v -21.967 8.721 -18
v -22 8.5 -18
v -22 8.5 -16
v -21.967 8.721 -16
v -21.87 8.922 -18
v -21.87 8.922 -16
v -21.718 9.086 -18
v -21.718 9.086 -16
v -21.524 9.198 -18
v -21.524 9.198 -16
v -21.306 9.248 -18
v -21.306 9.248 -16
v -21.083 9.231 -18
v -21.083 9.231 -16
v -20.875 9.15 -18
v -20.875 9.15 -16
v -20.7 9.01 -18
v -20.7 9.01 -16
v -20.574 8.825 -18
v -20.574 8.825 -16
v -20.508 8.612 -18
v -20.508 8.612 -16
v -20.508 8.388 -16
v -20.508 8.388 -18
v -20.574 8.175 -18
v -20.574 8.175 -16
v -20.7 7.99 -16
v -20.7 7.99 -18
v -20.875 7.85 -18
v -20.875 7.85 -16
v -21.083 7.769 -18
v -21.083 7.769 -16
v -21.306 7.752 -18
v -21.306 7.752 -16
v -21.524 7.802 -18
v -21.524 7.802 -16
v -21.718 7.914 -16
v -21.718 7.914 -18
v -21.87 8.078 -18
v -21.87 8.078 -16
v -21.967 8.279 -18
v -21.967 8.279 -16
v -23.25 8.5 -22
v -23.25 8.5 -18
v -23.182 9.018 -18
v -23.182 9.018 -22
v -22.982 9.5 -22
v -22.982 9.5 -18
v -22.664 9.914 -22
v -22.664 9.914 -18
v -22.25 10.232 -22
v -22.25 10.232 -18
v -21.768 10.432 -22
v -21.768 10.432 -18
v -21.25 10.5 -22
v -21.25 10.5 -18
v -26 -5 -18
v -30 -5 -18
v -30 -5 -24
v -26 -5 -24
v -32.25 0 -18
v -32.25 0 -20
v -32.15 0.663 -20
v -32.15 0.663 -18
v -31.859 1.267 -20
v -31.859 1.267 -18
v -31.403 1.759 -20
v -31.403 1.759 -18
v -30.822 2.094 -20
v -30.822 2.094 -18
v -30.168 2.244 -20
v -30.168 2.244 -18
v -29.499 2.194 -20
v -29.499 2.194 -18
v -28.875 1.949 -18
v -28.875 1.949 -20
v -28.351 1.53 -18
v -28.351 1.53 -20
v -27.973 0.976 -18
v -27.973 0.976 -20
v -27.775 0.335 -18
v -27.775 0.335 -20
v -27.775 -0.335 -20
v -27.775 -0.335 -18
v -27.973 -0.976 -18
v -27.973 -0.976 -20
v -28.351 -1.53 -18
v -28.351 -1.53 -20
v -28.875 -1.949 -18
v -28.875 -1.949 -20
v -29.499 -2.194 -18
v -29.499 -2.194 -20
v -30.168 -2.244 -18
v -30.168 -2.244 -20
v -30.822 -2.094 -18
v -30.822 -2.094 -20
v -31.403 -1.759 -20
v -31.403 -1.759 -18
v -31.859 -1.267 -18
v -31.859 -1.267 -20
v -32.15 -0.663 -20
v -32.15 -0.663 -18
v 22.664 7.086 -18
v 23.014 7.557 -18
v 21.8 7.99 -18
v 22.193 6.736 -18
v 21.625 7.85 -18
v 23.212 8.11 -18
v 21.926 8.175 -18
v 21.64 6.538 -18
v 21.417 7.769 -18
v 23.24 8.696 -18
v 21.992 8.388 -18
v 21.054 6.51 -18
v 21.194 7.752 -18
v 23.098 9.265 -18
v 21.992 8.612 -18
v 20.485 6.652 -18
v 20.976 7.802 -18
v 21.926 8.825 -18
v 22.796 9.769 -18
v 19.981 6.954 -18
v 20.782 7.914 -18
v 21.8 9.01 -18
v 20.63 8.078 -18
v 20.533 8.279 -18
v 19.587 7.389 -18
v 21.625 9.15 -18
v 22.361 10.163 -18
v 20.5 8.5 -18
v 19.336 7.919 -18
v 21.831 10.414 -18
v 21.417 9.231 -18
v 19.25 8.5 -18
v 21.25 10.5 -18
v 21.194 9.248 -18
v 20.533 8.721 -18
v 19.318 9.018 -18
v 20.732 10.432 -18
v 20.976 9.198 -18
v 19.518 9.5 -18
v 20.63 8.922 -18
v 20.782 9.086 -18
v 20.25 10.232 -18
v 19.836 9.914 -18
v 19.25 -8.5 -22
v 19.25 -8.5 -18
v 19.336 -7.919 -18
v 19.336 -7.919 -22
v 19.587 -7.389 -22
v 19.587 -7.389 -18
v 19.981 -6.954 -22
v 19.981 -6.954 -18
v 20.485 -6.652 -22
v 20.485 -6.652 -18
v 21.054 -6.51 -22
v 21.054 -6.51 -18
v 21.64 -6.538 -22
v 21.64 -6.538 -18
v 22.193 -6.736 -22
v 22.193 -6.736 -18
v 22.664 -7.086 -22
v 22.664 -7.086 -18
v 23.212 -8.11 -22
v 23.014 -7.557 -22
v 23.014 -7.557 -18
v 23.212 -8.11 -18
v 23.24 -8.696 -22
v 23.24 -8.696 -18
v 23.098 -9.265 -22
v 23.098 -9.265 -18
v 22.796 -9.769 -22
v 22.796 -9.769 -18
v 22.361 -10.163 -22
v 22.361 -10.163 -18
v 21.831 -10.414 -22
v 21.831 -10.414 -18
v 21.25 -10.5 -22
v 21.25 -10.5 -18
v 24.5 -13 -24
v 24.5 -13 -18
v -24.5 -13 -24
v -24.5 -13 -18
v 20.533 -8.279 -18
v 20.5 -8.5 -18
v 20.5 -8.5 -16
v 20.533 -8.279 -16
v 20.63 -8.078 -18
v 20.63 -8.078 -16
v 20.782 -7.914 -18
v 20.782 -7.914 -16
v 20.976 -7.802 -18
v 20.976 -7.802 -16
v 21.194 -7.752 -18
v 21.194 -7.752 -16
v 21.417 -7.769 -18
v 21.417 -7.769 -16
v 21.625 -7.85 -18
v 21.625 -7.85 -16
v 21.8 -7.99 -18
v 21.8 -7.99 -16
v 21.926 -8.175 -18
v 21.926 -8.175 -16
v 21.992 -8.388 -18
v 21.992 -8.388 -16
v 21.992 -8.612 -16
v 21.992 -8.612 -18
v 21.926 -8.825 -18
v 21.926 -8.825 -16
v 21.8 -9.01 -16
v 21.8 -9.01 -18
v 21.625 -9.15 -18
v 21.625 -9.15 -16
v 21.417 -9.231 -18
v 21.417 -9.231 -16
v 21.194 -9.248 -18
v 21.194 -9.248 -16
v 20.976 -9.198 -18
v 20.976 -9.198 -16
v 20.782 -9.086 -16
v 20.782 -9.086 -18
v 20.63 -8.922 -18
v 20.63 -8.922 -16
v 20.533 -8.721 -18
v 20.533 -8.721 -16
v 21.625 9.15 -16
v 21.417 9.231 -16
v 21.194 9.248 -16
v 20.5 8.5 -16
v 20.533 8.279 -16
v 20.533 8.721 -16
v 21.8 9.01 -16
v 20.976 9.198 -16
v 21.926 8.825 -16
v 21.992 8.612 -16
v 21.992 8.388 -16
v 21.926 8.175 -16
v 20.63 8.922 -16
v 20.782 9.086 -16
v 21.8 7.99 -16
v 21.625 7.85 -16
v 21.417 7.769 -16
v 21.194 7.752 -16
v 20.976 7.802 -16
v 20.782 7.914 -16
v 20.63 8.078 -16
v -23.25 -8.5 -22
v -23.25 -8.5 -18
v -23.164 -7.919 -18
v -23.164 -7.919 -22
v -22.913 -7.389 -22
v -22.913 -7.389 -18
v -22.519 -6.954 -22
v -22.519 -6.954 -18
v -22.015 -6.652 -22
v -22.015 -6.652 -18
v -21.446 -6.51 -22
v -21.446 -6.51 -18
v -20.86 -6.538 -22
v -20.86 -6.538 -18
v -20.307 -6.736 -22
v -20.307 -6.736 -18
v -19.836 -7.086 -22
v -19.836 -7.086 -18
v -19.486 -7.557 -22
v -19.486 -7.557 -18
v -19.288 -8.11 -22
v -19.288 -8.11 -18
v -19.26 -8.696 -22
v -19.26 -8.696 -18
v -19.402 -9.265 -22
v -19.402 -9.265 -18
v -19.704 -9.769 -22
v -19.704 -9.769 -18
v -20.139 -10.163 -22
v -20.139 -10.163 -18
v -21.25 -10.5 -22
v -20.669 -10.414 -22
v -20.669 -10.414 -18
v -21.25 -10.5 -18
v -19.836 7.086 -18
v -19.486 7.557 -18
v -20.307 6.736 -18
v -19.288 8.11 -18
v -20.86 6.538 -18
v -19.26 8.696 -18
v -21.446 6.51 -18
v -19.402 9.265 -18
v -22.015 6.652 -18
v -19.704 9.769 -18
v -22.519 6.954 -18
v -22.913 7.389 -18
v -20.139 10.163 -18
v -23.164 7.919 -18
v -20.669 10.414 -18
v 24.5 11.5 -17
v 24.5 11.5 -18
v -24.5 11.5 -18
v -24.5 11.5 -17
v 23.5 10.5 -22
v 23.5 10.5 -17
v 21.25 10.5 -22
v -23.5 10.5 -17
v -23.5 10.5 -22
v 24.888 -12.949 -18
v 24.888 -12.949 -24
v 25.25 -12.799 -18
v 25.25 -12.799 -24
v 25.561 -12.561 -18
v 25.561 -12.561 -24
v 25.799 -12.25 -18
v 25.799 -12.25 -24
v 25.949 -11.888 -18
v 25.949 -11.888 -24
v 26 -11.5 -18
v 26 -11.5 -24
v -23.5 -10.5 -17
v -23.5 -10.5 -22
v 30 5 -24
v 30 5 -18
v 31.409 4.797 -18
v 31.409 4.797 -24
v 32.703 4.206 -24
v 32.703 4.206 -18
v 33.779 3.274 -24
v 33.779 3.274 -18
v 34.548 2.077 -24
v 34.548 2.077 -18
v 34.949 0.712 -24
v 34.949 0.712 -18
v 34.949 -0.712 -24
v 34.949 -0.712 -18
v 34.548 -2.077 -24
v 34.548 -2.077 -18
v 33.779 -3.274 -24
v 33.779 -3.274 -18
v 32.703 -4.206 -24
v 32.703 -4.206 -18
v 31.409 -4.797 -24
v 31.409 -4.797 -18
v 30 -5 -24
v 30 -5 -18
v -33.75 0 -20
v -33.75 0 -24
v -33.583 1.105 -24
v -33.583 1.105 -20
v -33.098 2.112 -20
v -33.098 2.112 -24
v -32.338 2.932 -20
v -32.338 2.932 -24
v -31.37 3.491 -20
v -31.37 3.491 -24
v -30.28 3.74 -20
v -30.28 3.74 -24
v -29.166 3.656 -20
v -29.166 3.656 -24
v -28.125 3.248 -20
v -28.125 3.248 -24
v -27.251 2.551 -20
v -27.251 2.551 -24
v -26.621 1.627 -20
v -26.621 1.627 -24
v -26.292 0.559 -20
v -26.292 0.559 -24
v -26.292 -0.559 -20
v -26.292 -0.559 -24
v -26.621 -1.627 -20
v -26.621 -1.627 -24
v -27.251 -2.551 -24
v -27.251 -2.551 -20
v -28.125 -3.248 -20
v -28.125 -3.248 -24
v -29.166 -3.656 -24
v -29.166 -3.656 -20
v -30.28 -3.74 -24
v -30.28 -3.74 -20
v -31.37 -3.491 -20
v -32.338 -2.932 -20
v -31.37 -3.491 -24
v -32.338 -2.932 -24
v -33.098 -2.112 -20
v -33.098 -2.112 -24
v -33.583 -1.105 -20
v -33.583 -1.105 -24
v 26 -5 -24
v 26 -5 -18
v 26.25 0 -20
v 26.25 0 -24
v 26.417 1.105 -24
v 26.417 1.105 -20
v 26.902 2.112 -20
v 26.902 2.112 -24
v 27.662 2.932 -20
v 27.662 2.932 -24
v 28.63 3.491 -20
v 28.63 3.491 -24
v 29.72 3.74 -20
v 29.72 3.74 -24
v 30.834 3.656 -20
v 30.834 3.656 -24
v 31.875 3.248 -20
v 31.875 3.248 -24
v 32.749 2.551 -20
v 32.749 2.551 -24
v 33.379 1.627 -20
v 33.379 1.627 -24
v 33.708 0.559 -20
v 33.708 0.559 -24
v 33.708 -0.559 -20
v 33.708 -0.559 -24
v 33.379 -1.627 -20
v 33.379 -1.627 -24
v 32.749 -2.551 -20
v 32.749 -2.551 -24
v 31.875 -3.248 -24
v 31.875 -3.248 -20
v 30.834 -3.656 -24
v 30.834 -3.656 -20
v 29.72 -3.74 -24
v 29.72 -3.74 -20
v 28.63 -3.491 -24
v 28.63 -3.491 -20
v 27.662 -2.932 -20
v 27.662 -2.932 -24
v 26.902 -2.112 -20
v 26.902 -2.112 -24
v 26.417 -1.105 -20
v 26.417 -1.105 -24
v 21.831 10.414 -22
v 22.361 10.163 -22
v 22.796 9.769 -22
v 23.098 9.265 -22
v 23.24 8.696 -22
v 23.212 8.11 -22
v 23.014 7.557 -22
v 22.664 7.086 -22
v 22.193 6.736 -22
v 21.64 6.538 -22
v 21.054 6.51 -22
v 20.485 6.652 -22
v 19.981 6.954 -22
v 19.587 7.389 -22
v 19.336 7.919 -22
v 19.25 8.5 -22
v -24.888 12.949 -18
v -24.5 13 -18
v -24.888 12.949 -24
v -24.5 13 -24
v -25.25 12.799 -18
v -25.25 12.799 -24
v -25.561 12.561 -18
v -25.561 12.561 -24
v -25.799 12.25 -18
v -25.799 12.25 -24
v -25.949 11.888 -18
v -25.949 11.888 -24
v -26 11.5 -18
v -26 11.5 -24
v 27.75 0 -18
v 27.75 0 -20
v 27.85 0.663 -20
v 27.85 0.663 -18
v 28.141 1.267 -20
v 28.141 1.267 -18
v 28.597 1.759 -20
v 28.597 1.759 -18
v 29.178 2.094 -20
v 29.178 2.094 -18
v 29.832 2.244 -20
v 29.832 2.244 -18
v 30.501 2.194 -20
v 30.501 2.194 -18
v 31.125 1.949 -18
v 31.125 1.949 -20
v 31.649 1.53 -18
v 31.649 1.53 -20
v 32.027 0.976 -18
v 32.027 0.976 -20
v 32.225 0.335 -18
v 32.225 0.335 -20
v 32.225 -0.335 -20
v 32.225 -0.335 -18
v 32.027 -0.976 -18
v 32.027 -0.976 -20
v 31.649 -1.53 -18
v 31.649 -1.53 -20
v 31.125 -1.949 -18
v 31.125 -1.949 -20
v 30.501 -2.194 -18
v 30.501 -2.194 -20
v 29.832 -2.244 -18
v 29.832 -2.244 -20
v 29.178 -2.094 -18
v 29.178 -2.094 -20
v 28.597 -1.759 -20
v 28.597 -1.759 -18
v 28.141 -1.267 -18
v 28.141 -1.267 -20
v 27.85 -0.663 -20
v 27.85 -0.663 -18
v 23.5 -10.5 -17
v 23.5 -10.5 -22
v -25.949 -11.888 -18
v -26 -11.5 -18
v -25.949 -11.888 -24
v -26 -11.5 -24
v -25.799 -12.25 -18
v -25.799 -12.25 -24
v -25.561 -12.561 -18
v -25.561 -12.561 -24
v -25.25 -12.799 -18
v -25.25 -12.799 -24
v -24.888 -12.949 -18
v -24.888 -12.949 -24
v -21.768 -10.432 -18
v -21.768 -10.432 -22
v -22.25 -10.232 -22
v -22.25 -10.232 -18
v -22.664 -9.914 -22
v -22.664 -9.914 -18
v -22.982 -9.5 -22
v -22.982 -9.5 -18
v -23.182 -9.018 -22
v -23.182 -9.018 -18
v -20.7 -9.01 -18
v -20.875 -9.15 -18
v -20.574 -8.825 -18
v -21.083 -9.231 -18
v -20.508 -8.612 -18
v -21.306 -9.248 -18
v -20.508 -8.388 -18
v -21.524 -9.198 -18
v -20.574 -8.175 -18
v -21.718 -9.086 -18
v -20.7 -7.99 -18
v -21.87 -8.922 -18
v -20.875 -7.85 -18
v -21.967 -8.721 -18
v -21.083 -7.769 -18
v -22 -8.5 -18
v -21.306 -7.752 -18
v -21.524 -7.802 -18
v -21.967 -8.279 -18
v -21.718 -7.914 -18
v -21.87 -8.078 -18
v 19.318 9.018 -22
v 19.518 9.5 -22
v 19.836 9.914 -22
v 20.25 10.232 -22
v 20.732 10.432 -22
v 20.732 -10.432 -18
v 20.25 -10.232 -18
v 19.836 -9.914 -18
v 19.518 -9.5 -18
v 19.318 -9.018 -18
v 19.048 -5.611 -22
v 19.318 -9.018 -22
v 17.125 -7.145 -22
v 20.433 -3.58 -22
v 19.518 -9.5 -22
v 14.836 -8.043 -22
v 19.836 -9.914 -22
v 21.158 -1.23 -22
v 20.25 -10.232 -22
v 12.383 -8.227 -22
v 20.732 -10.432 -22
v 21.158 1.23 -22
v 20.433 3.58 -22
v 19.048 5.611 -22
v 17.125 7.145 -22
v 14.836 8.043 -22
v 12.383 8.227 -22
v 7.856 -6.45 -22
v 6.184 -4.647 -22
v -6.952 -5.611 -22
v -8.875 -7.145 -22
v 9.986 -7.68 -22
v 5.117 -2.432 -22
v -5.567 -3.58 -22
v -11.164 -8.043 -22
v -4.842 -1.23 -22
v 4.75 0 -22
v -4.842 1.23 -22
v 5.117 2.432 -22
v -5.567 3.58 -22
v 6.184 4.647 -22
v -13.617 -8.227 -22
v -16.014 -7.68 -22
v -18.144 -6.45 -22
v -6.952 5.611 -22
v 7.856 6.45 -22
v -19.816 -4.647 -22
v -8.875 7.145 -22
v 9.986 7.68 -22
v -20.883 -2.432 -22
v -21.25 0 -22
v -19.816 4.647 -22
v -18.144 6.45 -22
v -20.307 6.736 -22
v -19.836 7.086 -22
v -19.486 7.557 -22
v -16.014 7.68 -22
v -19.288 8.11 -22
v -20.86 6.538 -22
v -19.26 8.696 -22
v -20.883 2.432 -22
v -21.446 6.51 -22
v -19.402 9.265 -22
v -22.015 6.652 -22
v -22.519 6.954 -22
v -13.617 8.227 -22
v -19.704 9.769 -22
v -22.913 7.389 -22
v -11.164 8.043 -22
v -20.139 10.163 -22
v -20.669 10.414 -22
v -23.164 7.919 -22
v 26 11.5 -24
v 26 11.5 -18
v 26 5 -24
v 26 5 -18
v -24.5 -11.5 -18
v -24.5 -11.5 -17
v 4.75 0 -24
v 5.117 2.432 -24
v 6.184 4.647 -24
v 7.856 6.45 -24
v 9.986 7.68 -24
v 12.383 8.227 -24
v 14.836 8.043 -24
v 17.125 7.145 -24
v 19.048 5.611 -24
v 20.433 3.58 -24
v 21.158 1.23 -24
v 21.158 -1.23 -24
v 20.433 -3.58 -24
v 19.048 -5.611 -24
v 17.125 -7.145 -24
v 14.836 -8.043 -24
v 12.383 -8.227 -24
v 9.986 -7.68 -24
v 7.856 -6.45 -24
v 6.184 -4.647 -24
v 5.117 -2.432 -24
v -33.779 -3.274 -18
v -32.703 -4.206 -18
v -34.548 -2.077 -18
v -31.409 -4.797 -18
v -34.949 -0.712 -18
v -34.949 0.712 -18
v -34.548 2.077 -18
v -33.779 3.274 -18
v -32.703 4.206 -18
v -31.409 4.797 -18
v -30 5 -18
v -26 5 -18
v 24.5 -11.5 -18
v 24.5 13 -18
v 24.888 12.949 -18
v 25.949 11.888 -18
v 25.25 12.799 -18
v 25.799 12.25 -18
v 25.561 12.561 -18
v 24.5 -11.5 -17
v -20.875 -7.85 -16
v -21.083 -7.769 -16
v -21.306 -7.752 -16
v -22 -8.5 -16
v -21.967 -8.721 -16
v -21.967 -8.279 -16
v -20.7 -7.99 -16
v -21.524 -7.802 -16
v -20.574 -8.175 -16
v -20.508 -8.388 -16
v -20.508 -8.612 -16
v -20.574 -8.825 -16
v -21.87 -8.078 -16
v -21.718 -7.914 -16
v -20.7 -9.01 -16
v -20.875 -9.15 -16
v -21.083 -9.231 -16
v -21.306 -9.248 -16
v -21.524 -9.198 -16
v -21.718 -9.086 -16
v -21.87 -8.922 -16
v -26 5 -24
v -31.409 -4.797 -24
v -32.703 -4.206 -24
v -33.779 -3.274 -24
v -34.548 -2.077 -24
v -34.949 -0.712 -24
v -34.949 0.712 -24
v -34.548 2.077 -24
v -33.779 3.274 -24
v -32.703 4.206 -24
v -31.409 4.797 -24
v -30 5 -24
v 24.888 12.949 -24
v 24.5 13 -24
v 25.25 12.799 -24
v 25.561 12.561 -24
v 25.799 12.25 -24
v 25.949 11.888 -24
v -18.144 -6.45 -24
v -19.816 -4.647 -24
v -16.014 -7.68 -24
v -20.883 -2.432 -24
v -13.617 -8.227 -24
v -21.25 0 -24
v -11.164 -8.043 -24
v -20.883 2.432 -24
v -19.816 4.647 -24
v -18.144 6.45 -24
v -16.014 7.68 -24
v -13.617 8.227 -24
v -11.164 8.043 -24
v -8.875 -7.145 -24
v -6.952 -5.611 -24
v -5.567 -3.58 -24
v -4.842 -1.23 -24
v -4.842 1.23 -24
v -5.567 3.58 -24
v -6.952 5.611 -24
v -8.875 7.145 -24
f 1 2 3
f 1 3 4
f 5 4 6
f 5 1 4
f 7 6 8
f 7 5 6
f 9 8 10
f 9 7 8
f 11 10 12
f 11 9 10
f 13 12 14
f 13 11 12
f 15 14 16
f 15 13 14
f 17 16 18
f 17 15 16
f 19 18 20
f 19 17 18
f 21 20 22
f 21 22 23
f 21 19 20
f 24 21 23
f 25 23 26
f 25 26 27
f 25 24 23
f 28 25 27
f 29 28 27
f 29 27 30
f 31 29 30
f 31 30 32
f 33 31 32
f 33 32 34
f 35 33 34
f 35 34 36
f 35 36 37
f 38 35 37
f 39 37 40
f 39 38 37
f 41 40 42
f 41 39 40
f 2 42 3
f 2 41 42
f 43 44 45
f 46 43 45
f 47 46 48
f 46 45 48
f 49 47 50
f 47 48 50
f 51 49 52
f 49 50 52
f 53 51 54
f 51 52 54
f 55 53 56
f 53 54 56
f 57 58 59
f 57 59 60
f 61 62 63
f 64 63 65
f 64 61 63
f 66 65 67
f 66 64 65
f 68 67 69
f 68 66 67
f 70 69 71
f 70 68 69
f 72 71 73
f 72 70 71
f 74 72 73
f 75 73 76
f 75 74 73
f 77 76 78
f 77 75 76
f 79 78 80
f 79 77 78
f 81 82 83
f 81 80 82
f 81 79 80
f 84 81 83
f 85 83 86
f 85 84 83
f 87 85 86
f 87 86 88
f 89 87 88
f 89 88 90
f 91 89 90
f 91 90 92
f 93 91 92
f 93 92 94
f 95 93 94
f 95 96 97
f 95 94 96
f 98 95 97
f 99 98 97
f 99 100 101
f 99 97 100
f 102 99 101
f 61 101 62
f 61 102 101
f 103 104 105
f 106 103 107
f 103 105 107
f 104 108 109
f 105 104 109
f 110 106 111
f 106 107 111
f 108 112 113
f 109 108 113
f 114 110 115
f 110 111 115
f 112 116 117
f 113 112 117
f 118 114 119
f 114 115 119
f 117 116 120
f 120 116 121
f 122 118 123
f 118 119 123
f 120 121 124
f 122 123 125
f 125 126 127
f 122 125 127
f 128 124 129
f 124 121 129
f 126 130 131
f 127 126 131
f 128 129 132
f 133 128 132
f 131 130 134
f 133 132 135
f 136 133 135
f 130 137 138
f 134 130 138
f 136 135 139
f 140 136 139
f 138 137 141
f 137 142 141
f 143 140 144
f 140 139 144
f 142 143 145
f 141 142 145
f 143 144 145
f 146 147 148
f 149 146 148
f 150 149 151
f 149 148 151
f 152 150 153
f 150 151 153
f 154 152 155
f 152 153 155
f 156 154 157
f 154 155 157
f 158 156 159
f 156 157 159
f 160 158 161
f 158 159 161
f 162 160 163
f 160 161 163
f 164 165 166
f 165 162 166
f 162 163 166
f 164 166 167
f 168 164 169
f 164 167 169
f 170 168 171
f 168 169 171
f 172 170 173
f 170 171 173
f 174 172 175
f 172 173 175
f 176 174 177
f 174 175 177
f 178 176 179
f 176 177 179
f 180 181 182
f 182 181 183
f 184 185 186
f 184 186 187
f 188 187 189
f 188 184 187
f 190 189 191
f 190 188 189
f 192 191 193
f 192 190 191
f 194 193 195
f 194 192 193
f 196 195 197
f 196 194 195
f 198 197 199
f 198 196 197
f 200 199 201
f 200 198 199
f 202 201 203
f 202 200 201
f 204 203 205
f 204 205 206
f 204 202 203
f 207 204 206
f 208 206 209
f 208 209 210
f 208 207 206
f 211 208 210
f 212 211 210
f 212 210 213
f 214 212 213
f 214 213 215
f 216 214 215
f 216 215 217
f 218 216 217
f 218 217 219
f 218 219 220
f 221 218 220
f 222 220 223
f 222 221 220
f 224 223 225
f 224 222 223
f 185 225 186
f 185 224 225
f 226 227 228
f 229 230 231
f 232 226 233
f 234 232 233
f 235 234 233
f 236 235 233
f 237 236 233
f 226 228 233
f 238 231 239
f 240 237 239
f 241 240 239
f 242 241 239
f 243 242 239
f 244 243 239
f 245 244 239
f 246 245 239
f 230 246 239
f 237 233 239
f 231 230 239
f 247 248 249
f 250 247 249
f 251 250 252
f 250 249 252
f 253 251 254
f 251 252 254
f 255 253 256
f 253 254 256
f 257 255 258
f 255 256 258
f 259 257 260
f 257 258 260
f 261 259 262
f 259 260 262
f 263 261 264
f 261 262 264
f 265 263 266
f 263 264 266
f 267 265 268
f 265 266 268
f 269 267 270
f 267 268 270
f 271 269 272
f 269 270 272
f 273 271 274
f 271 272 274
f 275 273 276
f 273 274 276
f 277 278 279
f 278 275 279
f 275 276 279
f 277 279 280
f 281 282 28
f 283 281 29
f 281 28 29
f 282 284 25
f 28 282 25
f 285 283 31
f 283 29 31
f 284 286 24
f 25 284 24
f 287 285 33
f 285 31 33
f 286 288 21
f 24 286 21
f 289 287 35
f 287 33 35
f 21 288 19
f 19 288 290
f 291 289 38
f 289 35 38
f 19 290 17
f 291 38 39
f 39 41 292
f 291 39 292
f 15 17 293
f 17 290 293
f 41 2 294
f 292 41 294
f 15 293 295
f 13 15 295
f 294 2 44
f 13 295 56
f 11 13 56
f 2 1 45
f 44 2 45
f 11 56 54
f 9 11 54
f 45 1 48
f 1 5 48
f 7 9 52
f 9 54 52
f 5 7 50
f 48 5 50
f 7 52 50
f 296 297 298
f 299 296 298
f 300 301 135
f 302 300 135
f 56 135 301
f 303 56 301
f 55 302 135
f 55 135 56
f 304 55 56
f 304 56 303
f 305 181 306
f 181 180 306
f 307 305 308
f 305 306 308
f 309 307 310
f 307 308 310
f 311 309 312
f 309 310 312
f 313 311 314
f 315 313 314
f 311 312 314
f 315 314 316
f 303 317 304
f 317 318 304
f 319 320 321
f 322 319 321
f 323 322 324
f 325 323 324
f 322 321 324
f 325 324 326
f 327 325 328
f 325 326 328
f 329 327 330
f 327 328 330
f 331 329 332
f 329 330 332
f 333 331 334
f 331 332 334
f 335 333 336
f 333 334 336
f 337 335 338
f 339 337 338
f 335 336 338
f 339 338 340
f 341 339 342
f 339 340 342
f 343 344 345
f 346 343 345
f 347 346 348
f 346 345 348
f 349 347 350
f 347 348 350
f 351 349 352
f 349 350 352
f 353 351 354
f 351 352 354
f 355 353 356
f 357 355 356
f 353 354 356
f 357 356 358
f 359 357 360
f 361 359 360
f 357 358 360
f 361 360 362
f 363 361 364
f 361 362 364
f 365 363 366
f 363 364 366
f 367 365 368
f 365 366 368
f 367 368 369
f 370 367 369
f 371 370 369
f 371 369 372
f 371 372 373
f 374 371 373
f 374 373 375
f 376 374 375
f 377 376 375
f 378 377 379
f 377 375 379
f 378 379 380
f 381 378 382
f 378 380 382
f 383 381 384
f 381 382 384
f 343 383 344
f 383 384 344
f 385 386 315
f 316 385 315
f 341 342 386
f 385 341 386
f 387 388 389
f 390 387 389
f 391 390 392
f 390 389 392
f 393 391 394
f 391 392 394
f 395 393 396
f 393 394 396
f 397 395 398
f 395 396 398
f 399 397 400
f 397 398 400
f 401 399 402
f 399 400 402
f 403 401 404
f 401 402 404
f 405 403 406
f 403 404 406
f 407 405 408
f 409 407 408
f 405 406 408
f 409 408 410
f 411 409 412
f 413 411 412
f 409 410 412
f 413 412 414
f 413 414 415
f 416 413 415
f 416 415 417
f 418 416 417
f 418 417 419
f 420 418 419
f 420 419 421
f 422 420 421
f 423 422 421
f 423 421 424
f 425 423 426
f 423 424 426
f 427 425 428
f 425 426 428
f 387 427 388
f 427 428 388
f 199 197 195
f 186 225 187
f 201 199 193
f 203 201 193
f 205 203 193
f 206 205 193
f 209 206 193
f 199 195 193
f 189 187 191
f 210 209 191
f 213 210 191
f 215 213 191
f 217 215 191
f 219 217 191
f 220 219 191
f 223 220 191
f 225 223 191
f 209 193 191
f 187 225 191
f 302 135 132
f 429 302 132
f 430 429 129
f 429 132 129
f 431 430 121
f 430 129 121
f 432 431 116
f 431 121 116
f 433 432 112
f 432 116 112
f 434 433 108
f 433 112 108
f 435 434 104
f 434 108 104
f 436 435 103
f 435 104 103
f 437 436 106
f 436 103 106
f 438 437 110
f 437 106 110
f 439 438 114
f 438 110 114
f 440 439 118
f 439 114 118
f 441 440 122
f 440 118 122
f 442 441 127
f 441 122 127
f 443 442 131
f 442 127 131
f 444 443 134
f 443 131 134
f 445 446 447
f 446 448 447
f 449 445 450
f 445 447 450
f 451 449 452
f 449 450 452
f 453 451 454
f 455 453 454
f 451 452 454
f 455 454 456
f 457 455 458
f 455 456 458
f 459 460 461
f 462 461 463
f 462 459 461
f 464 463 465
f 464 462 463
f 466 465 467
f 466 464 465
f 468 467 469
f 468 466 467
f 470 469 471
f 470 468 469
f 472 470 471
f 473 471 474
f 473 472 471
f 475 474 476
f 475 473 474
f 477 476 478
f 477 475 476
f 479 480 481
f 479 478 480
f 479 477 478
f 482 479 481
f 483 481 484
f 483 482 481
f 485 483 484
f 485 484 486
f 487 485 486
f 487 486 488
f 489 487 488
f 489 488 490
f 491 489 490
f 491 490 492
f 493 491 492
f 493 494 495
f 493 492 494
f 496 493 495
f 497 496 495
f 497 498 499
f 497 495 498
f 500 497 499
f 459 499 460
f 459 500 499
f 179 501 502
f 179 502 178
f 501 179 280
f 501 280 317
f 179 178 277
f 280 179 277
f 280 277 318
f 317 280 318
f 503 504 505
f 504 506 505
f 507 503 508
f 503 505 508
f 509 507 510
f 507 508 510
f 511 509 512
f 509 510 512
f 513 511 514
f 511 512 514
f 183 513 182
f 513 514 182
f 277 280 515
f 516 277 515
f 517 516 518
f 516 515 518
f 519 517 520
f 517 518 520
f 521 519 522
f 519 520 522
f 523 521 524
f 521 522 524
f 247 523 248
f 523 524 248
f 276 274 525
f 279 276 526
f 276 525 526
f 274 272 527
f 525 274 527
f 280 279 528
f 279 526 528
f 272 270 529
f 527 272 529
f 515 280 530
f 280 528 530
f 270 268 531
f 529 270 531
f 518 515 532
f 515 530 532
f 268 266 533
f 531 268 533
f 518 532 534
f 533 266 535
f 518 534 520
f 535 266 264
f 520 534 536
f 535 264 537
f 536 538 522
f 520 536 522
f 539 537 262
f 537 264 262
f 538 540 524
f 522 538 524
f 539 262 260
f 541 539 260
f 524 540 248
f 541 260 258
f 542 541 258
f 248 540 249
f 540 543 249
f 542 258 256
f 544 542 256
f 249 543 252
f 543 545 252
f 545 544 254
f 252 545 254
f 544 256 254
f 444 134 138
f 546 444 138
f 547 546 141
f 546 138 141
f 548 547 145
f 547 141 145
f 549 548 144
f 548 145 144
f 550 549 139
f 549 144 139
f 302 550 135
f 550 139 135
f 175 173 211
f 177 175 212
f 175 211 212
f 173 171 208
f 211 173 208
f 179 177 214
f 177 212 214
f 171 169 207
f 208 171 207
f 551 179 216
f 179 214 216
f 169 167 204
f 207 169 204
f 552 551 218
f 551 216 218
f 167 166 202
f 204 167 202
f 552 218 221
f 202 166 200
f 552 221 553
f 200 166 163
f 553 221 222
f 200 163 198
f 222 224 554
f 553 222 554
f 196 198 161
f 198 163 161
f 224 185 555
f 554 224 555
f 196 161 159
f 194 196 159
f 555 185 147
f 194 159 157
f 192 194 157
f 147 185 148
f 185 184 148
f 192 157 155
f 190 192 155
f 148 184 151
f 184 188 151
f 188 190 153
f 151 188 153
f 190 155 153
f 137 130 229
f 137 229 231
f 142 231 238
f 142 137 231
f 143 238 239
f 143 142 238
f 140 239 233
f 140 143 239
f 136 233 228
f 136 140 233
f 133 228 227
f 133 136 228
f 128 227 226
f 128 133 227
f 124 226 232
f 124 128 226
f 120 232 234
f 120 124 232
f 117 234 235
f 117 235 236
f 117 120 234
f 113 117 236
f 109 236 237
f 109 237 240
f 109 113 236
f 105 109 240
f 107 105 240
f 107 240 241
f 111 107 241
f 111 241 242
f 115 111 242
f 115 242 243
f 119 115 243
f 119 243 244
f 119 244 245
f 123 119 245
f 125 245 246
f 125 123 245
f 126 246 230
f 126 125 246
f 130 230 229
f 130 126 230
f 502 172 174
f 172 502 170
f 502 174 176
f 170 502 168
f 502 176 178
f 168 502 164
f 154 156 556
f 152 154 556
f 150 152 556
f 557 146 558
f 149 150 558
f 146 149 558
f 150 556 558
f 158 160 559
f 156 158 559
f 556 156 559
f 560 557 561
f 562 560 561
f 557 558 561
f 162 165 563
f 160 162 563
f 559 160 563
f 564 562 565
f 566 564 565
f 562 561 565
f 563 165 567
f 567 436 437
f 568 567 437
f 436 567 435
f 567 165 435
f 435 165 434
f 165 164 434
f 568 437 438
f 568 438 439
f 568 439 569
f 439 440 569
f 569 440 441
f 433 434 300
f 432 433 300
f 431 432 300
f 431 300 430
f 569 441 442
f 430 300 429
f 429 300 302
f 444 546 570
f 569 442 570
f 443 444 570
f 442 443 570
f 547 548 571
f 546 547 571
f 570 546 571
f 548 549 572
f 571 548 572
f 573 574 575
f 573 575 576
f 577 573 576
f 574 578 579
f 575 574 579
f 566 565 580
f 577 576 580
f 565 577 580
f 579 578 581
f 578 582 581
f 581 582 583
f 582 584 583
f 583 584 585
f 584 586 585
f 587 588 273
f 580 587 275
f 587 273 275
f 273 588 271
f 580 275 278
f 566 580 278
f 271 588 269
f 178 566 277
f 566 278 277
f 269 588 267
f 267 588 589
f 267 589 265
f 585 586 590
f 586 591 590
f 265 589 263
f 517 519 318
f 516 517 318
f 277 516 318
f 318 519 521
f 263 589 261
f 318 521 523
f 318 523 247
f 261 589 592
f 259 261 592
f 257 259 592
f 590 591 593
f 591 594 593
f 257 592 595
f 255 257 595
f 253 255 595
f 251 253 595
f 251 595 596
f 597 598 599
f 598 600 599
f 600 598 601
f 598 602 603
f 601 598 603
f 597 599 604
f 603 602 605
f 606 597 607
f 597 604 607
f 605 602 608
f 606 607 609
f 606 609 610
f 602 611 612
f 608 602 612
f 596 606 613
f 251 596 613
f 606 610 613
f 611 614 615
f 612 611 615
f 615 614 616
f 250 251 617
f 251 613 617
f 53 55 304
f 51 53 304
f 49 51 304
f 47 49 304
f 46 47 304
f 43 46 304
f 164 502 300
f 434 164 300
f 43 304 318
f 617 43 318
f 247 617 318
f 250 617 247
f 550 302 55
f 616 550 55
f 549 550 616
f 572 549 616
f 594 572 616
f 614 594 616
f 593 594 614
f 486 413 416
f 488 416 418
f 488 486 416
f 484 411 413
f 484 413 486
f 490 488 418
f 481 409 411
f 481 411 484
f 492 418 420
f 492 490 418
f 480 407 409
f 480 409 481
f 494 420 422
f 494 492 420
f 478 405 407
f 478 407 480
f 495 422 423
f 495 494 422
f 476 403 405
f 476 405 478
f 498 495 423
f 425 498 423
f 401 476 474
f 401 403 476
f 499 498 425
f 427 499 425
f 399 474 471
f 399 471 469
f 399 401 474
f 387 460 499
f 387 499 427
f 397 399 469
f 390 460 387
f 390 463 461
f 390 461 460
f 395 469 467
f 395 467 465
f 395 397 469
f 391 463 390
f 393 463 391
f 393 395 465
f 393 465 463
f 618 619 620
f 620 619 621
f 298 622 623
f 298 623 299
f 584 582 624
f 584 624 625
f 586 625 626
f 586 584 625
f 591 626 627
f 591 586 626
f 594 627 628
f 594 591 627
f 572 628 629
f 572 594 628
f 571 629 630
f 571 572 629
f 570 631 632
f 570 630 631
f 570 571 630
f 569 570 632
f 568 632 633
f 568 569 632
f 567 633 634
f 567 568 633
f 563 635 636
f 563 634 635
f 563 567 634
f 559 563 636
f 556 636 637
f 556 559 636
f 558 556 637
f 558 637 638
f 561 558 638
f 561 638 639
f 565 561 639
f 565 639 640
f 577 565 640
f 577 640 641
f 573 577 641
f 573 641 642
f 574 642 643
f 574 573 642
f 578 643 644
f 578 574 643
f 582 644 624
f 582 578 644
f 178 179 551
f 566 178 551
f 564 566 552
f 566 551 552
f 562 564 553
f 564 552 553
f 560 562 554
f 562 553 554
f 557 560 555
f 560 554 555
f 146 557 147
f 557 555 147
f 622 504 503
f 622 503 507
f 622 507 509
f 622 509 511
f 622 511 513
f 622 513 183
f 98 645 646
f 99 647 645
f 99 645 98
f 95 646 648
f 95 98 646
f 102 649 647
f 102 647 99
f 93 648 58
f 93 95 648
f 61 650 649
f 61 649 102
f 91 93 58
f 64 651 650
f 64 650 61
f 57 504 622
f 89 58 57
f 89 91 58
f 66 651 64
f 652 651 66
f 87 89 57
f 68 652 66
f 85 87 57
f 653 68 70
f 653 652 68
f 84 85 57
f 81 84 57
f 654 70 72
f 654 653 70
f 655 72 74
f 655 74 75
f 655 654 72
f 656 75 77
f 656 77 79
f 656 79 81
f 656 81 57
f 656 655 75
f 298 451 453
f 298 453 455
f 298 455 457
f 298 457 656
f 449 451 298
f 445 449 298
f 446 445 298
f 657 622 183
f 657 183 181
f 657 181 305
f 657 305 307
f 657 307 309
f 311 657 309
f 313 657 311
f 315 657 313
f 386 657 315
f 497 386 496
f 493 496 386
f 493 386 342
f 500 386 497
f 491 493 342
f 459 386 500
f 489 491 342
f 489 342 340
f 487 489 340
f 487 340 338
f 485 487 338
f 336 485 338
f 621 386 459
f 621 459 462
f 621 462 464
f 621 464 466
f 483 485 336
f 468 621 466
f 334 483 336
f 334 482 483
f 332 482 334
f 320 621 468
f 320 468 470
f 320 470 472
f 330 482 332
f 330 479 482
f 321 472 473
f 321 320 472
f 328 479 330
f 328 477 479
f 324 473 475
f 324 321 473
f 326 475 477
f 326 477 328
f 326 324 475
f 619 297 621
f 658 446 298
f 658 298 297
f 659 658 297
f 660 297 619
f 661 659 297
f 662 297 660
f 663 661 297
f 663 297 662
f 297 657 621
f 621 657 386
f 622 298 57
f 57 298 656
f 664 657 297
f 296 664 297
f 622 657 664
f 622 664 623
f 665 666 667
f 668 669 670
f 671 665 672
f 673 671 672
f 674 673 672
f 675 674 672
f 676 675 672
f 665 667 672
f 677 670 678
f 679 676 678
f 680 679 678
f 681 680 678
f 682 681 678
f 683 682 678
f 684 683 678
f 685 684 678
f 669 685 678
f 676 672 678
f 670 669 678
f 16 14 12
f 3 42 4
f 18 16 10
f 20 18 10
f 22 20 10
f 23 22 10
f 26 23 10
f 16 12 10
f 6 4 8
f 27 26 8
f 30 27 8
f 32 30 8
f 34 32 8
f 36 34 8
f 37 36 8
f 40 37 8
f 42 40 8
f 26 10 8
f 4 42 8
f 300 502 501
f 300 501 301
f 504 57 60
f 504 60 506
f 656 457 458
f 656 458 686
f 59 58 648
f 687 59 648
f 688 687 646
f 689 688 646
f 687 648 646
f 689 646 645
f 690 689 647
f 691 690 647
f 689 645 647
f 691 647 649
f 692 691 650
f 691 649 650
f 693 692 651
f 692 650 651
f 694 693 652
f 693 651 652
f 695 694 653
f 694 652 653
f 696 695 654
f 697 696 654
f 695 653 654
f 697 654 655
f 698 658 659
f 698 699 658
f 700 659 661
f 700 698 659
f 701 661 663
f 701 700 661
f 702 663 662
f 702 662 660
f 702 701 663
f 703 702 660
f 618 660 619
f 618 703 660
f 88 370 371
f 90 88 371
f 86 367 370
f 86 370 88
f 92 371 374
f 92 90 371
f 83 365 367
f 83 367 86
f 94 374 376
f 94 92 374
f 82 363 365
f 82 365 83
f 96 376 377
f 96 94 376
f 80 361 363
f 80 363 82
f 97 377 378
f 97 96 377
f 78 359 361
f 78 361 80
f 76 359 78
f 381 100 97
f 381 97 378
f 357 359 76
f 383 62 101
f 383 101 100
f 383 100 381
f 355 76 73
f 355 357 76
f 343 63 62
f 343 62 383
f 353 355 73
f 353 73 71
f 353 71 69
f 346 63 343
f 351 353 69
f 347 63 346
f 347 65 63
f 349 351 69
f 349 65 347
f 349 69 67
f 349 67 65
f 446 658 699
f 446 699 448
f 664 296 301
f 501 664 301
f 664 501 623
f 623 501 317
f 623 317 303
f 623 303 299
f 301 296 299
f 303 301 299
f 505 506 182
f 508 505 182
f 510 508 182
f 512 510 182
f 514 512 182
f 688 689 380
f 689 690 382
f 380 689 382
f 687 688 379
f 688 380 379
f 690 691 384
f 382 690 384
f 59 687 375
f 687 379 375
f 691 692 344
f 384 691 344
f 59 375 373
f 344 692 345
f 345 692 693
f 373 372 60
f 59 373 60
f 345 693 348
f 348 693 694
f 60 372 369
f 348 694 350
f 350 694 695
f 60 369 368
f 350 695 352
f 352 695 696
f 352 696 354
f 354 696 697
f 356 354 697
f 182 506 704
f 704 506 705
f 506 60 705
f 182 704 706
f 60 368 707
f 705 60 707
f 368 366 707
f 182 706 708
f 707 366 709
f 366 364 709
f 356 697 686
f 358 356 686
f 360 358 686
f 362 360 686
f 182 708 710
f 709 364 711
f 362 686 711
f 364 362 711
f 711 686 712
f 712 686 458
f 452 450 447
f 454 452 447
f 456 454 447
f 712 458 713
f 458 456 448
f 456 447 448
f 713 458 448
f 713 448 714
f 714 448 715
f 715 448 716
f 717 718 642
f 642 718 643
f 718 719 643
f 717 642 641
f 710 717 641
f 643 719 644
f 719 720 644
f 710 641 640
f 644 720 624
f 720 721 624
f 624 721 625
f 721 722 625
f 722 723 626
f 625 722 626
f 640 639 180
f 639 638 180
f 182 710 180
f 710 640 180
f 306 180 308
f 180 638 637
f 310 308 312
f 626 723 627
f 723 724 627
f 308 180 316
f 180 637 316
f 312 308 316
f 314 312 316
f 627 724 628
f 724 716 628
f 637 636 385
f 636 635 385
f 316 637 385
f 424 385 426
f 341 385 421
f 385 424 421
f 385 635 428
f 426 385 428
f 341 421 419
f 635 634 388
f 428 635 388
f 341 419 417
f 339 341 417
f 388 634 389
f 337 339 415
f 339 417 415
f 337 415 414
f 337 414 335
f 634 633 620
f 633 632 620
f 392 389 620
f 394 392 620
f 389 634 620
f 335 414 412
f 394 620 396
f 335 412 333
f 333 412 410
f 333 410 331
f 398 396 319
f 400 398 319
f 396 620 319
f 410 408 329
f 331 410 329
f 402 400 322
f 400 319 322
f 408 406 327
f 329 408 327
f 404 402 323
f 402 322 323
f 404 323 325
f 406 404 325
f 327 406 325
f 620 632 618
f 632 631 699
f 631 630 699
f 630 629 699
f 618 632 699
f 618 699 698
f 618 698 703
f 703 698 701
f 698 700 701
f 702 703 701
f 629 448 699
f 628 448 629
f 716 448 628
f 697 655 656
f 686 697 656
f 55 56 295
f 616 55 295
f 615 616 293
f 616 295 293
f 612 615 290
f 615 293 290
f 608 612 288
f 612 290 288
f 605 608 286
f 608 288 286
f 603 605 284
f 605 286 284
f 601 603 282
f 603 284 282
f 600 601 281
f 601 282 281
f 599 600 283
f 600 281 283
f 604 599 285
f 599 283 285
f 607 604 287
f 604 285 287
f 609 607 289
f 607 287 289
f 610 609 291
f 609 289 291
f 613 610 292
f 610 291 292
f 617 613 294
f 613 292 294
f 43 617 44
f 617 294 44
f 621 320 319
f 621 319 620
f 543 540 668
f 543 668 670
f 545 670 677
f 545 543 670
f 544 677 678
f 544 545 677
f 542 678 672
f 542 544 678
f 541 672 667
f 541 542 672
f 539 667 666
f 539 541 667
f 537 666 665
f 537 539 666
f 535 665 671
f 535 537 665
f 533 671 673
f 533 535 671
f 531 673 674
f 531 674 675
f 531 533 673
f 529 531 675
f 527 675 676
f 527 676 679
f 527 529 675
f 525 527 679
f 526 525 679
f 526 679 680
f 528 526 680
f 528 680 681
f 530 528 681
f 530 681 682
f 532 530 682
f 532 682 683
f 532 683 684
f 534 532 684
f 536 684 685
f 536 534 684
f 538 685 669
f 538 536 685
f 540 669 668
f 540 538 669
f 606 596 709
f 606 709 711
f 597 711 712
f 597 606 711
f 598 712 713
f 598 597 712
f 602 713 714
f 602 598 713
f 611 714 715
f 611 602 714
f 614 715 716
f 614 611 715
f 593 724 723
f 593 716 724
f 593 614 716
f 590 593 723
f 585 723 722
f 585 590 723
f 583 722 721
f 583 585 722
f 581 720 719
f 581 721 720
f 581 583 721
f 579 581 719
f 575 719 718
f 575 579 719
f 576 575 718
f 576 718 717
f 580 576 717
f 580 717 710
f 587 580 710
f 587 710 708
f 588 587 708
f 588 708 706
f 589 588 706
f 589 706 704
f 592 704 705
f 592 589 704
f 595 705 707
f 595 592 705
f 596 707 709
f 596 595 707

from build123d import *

# Parameters (mm, degrees)
SKETCH011_R             = 2.25
PAD004_DEPTH            = 6
SKETCH021_W             = 49
SKETCH021_H             = 23
SKETCH021_W_2           = 47
SKETCH021_H_2           = 21
PAD005_DEPTH            = 1
SKETCH020_W             = 47
SKETCH020_H             = 21
POCKET005_DEPTH         = 4
SKETCH012_R             = 8.25
POCKET006_DEPTH         = 8
POCKET006_DEPTH_BACK    = 8
SKETCH022_R             = 3.75
POCKET007_DEPTH         = 4
SKETCH024_R             = 2
PAD006_DEPTH            = 6
SKETCH025_R             = 0.75
PAD007_DEPTH            = 2
FILLET001_R             = 1.5
BODY001_PLACEMENT_ANGLE = 180


with BuildPart() as part:
    # Sketch011 → Pad004 (new body)
    with BuildSketch(Plane.XY):
        with BuildLine():
            Line((-26, 13), (26, 13))
            Line((26, 13), (26, 5))
            Line((30, 5), (26, 5))
            ThreePointArc((29.999982, -5), (35, -9e-06), (30, 5))
            Line((29.999982, -5), (25.999982, -5))
            Line((25.999982, -5), (25.999982, -13))
            Line((-26, -13), (25.999982, -13))
            Line((-26, -5), (-26, -13))
            Line((-30, -5), (-26, -5))
            ThreePointArc((-30, 5), (-35, 0), (-30, -5))
            Line((-30, 5), (-26, 5))
            Line((-26, 13), (-26, 5))
        make_face()
        with Locations((-30, 0)):
            Circle(SKETCH011_R, mode=Mode.SUBTRACT)
        with Locations((30, 0)):
            Circle(SKETCH011_R, mode=Mode.SUBTRACT)
    extrude(amount=PAD004_DEPTH)

    # Sketch021 → Pad005 (join, symmetric)
    with BuildSketch(Plane.XY):
        Rectangle(SKETCH021_W, SKETCH021_H)
        Rectangle(SKETCH021_W_2, SKETCH021_H_2, mode=Mode.SUBTRACT)
    extrude(amount=PAD005_DEPTH, both=True)

    # Sketch020 → Pocket005 (cut)
    with BuildSketch(Plane.XY):
        Rectangle(SKETCH020_W, SKETCH020_H)
    extrude(amount=POCKET005_DEPTH, mode=Mode.SUBTRACT)

    # Sketch012 → Pocket006 (cut, two sides)
    with BuildSketch(Plane.XY) as pocket006_sk:
        with Locations((-13, 0)):
            Circle(SKETCH012_R)
        with Locations((13, 0)):
            Circle(SKETCH012_R)
    extrude(amount=-POCKET006_DEPTH, mode=Mode.SUBTRACT)
    extrude(pocket006_sk.sketch, amount=POCKET006_DEPTH_BACK, mode=Mode.SUBTRACT)

    # Sketch022 (on Face5 of Pocket006) → Pocket007 (cut)
    with BuildSketch(Plane.XY.offset(6)):
        with Locations((-30, 0)):
            Circle(SKETCH022_R)
        with Locations((30, 0)):
            Circle(SKETCH022_R)
    extrude(amount=-POCKET007_DEPTH, mode=Mode.SUBTRACT)

    # Sketch024 → Pad006 (join)
    with BuildSketch(Plane.XY):
        with Locations((21.25, 8.5)):
            Circle(SKETCH024_R)
        with Locations((-21.25, 8.5)):
            Circle(SKETCH024_R)
        with Locations((-21.25, -8.5)):
            Circle(SKETCH024_R)
        with Locations((21.25, -8.5)):
            Circle(SKETCH024_R)
    extrude(amount=PAD006_DEPTH)

    # Sketch025 → Pad007 (join)
    with BuildSketch(Plane.XY):
        with Locations((-21.25, 8.5)):
            Circle(SKETCH025_R)
        with Locations((-21.25, -8.5)):
            Circle(SKETCH025_R)
        with Locations((21.25, 8.5)):
            Circle(SKETCH025_R)
        with Locations((21.25, -8.5)):
            Circle(SKETCH025_R)
    extrude(amount=-PAD007_DEPTH)

    # Fillet001
    fillet001_edges = [part.edges().sort_by_distance(p)[0] for p in [
        (26, 13, 3),
        (25.999982, -13, 3),
        (-26, 13, 3),
        (-26, -13, 3),
    ]]
    fillet(fillet001_edges, radius=FILLET001_R)


with BuildPart() as part_1:
    # Body001 placement: moved
    add(part.part.moved(Location((0, 0, -18))).rotate(Axis((0, 0, -18), (0, 1, 0)), BODY001_PLACEMENT_ANGLE))


solid = part_1.part
